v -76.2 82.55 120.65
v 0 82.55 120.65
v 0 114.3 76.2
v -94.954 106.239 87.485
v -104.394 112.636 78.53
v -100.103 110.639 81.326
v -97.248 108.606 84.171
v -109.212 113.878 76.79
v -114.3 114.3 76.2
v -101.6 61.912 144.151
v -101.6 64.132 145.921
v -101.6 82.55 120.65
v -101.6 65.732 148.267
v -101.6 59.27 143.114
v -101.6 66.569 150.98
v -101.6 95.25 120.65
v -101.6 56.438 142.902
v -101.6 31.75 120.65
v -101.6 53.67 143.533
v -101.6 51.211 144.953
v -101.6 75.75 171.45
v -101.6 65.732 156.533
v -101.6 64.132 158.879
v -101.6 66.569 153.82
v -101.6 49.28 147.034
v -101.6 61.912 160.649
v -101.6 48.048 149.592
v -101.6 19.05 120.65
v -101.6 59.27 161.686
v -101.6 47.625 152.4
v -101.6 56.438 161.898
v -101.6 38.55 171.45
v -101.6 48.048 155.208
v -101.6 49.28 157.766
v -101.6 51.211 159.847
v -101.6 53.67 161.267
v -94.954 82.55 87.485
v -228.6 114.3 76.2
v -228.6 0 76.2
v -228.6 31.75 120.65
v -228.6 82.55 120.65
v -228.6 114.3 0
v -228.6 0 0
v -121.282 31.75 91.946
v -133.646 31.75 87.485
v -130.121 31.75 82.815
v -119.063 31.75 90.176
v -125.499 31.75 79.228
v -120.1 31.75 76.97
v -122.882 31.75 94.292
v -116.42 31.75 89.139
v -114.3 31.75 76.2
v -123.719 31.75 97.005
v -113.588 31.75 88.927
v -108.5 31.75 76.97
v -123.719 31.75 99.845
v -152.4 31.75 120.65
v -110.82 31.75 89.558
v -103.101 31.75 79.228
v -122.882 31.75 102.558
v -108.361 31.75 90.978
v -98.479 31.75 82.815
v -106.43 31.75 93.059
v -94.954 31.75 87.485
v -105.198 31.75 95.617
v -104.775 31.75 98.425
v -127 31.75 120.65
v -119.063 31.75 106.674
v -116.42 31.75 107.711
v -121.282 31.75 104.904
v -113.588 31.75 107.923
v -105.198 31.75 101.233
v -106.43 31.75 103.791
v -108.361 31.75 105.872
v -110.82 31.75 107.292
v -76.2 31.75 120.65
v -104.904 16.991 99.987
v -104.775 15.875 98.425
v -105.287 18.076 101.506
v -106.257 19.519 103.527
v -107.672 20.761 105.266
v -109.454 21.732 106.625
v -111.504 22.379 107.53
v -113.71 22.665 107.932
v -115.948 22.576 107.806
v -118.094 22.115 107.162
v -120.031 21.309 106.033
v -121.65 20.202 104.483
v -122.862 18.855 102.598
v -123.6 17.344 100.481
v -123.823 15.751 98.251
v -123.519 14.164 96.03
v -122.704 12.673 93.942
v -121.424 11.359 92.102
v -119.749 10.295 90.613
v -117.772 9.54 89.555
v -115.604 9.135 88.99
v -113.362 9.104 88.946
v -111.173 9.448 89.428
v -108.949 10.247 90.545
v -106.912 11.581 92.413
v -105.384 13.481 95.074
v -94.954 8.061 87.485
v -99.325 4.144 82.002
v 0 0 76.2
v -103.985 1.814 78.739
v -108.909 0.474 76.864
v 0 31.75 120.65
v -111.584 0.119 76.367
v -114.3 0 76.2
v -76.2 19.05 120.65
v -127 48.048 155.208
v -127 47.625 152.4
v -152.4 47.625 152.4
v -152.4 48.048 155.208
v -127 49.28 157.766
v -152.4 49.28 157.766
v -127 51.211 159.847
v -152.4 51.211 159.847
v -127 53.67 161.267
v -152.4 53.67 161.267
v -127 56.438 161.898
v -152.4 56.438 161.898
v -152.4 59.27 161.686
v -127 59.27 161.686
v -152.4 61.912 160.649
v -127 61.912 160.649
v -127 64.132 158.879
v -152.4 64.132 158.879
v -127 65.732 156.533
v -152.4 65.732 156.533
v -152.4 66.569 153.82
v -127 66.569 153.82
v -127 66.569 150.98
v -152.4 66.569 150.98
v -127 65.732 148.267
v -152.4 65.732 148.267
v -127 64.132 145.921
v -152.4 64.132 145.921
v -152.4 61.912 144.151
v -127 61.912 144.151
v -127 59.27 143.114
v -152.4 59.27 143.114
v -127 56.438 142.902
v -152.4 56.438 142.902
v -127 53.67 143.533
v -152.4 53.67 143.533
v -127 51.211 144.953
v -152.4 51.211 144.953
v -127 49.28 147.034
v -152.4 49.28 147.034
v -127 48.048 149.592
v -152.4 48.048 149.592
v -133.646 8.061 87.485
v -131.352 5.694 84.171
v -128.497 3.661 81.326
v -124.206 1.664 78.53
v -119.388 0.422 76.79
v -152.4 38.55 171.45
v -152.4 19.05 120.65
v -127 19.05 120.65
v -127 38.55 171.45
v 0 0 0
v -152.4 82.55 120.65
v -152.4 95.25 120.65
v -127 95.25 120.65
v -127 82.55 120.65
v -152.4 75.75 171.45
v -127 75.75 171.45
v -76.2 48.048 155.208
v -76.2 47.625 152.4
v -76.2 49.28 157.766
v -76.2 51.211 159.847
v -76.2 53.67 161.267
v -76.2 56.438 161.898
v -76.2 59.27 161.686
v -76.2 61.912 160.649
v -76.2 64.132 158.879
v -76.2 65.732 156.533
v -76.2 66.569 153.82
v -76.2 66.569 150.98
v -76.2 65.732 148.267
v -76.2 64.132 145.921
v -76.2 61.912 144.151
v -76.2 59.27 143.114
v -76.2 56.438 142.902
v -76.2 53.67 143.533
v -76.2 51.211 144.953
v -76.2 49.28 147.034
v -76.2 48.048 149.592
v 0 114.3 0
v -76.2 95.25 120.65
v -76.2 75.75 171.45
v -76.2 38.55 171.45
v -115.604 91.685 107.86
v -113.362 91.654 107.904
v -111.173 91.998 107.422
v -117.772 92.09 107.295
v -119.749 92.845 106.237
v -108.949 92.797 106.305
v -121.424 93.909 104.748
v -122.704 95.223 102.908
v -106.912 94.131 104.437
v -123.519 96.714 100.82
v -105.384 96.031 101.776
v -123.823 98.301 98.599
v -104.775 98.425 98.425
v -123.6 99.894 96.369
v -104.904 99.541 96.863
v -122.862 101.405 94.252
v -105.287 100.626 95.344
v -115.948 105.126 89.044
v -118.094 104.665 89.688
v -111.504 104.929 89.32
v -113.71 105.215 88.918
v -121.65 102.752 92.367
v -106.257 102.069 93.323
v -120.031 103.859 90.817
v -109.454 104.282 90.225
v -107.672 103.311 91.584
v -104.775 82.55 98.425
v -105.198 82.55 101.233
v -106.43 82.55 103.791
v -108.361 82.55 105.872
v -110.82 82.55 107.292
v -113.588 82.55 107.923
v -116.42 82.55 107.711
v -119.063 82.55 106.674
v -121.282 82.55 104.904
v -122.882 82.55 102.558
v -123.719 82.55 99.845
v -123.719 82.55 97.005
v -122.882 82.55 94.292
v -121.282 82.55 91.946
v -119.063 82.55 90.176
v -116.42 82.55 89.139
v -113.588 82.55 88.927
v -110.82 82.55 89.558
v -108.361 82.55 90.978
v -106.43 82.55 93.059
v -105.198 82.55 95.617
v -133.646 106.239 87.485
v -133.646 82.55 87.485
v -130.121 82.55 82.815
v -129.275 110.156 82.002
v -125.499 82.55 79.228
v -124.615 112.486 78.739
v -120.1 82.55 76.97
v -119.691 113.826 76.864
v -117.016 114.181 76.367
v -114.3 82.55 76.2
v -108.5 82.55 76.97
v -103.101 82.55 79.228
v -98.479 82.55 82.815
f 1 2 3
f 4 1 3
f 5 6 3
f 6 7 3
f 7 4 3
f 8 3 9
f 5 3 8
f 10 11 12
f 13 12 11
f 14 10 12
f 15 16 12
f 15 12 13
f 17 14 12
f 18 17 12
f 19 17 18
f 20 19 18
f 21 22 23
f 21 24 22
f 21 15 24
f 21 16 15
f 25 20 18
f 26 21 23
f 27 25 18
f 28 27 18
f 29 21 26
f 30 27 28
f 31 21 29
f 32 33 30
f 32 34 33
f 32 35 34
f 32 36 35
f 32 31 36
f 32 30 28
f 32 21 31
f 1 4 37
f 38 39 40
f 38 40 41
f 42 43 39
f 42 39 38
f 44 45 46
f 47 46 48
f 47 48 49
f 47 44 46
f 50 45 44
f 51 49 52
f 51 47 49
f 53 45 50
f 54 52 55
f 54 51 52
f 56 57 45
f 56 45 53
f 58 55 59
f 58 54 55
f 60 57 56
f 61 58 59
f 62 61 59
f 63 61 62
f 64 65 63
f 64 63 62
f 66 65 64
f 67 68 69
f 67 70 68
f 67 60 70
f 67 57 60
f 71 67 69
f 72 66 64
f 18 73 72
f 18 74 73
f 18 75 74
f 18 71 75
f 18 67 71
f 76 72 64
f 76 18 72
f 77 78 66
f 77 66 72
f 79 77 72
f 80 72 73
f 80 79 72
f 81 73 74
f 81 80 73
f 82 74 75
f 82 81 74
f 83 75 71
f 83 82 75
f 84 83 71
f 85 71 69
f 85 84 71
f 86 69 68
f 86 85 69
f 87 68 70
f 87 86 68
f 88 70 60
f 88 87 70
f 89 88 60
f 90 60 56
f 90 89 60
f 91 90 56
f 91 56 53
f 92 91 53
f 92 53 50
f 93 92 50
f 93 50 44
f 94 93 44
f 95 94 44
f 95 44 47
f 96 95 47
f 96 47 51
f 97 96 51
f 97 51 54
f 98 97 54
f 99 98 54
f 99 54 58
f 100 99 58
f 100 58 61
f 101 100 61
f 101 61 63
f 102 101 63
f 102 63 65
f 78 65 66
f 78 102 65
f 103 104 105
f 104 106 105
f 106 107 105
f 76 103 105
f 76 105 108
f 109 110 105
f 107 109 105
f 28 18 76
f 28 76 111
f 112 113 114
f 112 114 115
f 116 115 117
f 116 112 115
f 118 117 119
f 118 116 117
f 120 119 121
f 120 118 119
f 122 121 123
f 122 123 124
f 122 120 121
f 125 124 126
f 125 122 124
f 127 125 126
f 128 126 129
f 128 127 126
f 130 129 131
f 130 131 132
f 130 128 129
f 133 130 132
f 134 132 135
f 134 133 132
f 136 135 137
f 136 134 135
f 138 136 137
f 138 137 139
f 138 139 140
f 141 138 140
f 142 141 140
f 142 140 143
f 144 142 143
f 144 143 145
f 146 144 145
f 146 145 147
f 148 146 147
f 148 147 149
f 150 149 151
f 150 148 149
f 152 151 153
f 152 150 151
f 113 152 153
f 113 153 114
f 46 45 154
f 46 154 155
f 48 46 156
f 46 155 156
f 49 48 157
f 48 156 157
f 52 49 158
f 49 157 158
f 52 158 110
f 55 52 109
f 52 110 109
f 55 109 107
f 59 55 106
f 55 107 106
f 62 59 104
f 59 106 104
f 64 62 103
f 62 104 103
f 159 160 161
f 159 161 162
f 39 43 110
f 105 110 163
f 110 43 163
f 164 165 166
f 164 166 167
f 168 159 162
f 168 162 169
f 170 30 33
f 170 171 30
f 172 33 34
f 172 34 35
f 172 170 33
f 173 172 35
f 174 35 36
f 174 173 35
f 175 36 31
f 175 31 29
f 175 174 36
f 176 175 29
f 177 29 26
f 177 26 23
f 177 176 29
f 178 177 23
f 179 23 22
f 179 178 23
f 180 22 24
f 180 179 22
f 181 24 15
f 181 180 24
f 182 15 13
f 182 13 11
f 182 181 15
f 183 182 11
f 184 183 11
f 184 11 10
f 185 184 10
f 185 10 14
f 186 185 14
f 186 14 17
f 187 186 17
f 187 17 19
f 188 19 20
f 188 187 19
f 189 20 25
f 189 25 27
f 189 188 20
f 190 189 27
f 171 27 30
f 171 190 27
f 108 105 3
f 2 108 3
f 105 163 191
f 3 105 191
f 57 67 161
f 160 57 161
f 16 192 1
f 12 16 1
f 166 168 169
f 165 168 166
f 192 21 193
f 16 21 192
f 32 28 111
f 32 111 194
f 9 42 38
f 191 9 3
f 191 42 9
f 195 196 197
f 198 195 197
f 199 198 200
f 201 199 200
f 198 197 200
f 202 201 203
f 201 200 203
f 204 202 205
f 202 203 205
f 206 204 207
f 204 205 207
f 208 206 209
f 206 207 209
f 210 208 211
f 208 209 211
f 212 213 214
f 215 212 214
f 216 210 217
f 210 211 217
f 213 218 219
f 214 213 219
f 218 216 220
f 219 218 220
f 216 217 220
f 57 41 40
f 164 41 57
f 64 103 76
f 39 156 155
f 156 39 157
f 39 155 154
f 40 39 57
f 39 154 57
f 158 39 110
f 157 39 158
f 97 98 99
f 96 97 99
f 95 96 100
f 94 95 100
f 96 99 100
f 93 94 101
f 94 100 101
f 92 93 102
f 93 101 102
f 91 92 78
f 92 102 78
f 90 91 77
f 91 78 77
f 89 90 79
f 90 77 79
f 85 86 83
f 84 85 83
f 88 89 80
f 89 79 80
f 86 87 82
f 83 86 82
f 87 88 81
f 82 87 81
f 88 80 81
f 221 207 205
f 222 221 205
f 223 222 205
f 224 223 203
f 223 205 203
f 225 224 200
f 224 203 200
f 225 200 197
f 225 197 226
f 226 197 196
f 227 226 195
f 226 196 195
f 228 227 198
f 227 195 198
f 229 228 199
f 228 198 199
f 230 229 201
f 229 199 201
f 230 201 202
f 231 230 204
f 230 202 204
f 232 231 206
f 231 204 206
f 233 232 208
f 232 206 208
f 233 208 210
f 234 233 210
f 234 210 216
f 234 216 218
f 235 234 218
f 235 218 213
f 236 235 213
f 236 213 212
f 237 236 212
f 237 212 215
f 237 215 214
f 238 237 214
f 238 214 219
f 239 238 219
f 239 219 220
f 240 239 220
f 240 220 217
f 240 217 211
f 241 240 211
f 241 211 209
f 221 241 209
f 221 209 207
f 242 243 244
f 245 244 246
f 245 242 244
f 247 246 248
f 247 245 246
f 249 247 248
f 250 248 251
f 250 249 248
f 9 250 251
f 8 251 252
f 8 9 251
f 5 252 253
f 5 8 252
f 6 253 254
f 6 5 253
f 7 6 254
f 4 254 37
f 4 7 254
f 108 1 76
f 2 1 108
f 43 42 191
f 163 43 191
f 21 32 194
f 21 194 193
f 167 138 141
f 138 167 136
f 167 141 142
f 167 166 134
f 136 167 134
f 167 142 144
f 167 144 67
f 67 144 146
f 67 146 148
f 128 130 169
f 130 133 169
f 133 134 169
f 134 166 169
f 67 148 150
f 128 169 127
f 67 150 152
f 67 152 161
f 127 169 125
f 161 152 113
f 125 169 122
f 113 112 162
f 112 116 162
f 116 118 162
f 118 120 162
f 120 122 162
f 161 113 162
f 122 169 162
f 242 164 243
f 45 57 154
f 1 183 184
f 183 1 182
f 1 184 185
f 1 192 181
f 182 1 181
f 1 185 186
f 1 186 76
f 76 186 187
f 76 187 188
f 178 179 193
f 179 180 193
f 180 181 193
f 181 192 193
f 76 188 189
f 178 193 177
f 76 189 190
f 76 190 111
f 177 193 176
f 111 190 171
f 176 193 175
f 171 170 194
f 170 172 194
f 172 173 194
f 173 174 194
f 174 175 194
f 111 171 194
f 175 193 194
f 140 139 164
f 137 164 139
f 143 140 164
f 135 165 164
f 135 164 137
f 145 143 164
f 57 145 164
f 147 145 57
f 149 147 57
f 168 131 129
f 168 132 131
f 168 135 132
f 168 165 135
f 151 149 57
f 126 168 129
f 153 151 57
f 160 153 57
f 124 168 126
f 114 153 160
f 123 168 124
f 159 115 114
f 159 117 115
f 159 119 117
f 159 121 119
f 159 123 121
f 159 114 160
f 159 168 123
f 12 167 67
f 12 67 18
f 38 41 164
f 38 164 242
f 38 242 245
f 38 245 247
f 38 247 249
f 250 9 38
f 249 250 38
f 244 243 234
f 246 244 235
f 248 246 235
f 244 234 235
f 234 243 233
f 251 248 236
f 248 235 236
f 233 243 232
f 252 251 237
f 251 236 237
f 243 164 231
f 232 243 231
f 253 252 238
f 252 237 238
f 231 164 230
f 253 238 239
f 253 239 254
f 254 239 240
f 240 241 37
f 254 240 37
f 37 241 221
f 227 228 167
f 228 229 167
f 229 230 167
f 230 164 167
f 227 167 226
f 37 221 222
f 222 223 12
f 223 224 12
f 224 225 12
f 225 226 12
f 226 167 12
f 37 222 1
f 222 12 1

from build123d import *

# Parameters (mm, degrees)
F0_W      = 228.6
F0_H      = 114.3
F1_DEPTH  = 120.65
F6_R      = 9.525
F7_DEPTH  = 38.1
F8_DEPTH  = 12.7
F10_DEPTH = 228.6
F11_R     = 9.525
F12_DEPTH = 31.75


# Not quite as in the source:
# - a pattern or mirror of a feature is missing from the dataset's text; its kind, count and spacing are read off the source's solid


with BuildPart() as f1:
    # F0 (on Top) → F1 (new body)
    with BuildSketch(Plane.XY):
        with Locations((-114.3, 57.15)):
            Rectangle(F0_W, F0_H)
    extrude(amount=F1_DEPTH)

    # F6 (on 3pt) → F7 (join, symmetric)
    with BuildSketch(Plane(origin=(-114.3, 0, 0), x_dir=(0, -1, 0), z_dir=(-1, 0, 0))):
        Polygon((-75.7497070202, 171.45), (-95.25, 120.65), (-19.05, 120.65), (-38.5502929798, 171.45), align=None)
        with Locations((-57.15, 152.4)):
            Circle(F6_R, mode=Mode.SUBTRACT)
    extrude(amount=F7_DEPTH, both=True)

    # F6 (on 3pt) → F8 (cut, symmetric)
    with BuildSketch(Plane(origin=(-114.3, 0, 0), x_dir=(0, -1, 0), z_dir=(-1, 0, 0))):
        Polygon((-75.7497070202, 171.45), (-95.25, 120.65), (-19.05, 120.65), (-38.5502929798, 171.45), align=None)
        with Locations((-57.15, 152.4)):
            Circle(F6_R, mode=Mode.SUBTRACT)
    extrude(amount=F8_DEPTH, both=True, mode=Mode.SUBTRACT)

    # F9 (on face) → F10 (cut, through all)
    with BuildSketch(Plane.YZ):
        Polygon((31.75, 120.65), (0, 120.65), (0, 76.2), align=None)
        Polygon((114.3, 120.65), (82.55, 120.65), (114.3, 76.2), align=None)
    extrude(amount=-F10_DEPTH, mode=Mode.SUBTRACT)

    # F11 (on face) → F12 (cut)
    with BuildSketch(Plane.XZ):
        with BuildLine():
            Line((-152.4, 120.65), (-133.6461139863, 87.4852331607))
            ThreePointArc((-133.6461139892, 87.4852331591), (-114.3000000002, 76.2), (-94.9538860115, 87.4852331593))
            Line((-94.9538860135, 87.4852331605), (-76.2, 120.65))
            Line((-76.2, 120.65), (-152.4, 120.65))
        make_face()
        with Locations((-114.3000000004, 98.425)):
            Circle(F11_R, mode=Mode.SUBTRACT)
    f12 = extrude(amount=-F12_DEPTH, mode=Mode.SUBTRACT)

    # F12_copies: F12 across plane
    add(f12.mirror(Plane.ZX.offset(57.15)), mode=Mode.SUBTRACT)


solid = f1.part
